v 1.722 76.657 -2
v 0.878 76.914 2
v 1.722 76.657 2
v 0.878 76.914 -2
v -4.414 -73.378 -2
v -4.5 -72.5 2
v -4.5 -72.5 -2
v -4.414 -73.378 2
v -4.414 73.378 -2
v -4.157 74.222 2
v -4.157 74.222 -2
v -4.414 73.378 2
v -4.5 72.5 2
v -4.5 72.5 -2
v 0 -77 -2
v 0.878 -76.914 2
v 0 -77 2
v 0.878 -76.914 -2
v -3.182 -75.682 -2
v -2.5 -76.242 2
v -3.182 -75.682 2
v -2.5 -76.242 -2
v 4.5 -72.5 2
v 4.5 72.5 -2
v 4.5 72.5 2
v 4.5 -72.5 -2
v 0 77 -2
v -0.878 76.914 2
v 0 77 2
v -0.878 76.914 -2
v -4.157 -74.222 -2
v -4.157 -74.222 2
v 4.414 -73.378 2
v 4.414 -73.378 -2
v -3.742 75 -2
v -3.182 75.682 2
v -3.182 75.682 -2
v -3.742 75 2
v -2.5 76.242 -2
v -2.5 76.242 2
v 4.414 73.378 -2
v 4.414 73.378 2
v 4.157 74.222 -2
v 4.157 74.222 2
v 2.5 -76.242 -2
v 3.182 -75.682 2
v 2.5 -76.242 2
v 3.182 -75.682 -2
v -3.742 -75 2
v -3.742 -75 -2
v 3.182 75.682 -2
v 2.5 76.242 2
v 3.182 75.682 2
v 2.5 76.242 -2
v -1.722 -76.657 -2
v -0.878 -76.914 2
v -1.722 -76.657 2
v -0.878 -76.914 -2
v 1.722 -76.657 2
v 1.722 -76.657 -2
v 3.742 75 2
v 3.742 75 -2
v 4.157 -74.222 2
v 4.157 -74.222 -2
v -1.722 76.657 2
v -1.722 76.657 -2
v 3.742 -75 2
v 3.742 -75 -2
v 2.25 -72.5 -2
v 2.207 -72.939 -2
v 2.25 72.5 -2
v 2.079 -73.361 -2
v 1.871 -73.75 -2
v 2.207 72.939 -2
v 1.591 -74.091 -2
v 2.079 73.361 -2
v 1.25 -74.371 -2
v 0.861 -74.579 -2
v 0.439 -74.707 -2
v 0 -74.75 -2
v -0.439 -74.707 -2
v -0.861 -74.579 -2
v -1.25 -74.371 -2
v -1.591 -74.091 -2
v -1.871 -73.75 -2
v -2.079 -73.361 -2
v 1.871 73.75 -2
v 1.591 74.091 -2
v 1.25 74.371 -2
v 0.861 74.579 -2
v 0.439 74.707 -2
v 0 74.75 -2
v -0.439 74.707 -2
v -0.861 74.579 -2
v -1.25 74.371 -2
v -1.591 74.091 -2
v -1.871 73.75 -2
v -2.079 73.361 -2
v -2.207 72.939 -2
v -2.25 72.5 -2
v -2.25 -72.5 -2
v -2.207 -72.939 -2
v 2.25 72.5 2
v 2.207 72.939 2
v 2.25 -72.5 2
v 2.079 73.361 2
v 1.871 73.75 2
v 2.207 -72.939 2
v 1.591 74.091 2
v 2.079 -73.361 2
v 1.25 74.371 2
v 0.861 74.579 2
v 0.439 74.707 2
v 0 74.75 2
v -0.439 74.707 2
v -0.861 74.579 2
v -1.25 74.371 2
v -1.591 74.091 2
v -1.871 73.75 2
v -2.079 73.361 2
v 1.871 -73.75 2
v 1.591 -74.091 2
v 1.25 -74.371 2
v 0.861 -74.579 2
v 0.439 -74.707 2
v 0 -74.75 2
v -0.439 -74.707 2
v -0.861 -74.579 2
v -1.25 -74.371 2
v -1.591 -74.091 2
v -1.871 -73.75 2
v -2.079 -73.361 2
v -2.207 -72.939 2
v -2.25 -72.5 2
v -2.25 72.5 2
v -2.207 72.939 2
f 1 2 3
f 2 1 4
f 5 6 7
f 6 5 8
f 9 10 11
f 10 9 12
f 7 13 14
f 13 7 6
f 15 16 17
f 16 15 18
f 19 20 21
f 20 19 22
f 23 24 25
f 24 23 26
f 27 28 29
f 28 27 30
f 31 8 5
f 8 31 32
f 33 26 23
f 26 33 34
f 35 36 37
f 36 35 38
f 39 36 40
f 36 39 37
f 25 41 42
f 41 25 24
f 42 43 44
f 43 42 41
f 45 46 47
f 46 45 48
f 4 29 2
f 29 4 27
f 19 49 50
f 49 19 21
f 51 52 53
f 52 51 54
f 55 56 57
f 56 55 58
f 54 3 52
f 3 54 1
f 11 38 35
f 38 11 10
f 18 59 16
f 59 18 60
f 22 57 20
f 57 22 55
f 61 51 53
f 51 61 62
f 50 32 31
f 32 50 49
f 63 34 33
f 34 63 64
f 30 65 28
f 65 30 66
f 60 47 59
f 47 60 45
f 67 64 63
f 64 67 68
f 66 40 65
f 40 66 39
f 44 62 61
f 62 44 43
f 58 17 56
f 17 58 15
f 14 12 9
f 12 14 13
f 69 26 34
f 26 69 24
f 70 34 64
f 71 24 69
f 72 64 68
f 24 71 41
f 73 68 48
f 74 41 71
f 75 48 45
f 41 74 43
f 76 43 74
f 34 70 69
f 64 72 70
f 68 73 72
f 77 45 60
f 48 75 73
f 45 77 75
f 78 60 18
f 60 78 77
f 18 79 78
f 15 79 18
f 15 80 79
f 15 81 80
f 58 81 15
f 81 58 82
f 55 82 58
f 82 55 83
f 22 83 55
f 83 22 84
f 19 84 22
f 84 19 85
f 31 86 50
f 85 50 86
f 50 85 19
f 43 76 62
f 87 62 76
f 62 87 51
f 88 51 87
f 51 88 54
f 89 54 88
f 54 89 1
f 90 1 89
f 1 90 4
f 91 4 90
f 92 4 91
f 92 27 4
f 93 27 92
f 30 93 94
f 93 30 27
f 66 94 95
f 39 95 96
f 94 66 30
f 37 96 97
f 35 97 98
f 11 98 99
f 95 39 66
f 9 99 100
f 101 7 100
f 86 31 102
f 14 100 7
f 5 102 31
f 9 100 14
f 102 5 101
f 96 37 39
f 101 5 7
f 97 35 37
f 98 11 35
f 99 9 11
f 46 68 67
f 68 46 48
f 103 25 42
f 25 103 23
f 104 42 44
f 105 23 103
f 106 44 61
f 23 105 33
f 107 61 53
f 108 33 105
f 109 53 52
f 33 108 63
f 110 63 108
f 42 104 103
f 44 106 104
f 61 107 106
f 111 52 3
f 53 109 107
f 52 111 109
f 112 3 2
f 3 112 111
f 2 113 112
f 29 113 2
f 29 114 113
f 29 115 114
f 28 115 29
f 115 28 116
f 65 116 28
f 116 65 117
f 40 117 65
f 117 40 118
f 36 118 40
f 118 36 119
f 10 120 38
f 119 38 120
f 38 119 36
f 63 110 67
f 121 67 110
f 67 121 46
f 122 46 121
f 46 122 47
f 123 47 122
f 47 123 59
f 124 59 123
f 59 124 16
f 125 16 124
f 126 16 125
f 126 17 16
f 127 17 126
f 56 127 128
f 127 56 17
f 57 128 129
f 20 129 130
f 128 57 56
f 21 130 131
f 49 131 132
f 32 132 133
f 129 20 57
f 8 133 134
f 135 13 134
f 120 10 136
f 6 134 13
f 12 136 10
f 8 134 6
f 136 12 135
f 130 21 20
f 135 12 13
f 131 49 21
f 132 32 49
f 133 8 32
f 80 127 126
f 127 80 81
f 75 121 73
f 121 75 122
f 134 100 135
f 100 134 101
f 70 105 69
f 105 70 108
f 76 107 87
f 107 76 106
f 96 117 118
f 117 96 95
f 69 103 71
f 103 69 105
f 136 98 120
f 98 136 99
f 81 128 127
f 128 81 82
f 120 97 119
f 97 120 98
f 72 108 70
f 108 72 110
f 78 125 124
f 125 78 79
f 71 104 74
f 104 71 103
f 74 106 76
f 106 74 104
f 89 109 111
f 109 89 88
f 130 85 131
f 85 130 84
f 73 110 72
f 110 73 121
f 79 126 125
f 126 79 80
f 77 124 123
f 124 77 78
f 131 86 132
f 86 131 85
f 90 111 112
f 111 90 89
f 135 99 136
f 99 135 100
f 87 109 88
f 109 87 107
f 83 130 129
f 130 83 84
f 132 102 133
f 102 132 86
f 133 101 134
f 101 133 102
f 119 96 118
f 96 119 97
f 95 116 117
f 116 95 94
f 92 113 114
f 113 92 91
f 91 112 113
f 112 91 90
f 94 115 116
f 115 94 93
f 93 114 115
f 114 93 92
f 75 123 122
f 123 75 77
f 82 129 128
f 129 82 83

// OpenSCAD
len_phone = 145;
d_screw_m4 = 4.5;


module t_cross() {
    hull() {
        translate([0, -len_phone/2, 0])
        cylinder(d=9, h=4, center=true, $fn=32);

        translate([0, len_phone/2, 0])
        cylinder(d=9, h=4, center=true, $fn=32);
    }
}

module screw_hole() {
    color("red")
    hull() {
        translate([0, -len_phone/2, 0])
        cylinder(d=d_screw_m4, h=6, center=true, $fn=32);

        translate([0, len_phone/2, 0])
        cylinder(d=d_screw_m4, h=6, center=true, $fn=32);
    }
}


difference() {
    t_cross();
    screw_hole();
}
